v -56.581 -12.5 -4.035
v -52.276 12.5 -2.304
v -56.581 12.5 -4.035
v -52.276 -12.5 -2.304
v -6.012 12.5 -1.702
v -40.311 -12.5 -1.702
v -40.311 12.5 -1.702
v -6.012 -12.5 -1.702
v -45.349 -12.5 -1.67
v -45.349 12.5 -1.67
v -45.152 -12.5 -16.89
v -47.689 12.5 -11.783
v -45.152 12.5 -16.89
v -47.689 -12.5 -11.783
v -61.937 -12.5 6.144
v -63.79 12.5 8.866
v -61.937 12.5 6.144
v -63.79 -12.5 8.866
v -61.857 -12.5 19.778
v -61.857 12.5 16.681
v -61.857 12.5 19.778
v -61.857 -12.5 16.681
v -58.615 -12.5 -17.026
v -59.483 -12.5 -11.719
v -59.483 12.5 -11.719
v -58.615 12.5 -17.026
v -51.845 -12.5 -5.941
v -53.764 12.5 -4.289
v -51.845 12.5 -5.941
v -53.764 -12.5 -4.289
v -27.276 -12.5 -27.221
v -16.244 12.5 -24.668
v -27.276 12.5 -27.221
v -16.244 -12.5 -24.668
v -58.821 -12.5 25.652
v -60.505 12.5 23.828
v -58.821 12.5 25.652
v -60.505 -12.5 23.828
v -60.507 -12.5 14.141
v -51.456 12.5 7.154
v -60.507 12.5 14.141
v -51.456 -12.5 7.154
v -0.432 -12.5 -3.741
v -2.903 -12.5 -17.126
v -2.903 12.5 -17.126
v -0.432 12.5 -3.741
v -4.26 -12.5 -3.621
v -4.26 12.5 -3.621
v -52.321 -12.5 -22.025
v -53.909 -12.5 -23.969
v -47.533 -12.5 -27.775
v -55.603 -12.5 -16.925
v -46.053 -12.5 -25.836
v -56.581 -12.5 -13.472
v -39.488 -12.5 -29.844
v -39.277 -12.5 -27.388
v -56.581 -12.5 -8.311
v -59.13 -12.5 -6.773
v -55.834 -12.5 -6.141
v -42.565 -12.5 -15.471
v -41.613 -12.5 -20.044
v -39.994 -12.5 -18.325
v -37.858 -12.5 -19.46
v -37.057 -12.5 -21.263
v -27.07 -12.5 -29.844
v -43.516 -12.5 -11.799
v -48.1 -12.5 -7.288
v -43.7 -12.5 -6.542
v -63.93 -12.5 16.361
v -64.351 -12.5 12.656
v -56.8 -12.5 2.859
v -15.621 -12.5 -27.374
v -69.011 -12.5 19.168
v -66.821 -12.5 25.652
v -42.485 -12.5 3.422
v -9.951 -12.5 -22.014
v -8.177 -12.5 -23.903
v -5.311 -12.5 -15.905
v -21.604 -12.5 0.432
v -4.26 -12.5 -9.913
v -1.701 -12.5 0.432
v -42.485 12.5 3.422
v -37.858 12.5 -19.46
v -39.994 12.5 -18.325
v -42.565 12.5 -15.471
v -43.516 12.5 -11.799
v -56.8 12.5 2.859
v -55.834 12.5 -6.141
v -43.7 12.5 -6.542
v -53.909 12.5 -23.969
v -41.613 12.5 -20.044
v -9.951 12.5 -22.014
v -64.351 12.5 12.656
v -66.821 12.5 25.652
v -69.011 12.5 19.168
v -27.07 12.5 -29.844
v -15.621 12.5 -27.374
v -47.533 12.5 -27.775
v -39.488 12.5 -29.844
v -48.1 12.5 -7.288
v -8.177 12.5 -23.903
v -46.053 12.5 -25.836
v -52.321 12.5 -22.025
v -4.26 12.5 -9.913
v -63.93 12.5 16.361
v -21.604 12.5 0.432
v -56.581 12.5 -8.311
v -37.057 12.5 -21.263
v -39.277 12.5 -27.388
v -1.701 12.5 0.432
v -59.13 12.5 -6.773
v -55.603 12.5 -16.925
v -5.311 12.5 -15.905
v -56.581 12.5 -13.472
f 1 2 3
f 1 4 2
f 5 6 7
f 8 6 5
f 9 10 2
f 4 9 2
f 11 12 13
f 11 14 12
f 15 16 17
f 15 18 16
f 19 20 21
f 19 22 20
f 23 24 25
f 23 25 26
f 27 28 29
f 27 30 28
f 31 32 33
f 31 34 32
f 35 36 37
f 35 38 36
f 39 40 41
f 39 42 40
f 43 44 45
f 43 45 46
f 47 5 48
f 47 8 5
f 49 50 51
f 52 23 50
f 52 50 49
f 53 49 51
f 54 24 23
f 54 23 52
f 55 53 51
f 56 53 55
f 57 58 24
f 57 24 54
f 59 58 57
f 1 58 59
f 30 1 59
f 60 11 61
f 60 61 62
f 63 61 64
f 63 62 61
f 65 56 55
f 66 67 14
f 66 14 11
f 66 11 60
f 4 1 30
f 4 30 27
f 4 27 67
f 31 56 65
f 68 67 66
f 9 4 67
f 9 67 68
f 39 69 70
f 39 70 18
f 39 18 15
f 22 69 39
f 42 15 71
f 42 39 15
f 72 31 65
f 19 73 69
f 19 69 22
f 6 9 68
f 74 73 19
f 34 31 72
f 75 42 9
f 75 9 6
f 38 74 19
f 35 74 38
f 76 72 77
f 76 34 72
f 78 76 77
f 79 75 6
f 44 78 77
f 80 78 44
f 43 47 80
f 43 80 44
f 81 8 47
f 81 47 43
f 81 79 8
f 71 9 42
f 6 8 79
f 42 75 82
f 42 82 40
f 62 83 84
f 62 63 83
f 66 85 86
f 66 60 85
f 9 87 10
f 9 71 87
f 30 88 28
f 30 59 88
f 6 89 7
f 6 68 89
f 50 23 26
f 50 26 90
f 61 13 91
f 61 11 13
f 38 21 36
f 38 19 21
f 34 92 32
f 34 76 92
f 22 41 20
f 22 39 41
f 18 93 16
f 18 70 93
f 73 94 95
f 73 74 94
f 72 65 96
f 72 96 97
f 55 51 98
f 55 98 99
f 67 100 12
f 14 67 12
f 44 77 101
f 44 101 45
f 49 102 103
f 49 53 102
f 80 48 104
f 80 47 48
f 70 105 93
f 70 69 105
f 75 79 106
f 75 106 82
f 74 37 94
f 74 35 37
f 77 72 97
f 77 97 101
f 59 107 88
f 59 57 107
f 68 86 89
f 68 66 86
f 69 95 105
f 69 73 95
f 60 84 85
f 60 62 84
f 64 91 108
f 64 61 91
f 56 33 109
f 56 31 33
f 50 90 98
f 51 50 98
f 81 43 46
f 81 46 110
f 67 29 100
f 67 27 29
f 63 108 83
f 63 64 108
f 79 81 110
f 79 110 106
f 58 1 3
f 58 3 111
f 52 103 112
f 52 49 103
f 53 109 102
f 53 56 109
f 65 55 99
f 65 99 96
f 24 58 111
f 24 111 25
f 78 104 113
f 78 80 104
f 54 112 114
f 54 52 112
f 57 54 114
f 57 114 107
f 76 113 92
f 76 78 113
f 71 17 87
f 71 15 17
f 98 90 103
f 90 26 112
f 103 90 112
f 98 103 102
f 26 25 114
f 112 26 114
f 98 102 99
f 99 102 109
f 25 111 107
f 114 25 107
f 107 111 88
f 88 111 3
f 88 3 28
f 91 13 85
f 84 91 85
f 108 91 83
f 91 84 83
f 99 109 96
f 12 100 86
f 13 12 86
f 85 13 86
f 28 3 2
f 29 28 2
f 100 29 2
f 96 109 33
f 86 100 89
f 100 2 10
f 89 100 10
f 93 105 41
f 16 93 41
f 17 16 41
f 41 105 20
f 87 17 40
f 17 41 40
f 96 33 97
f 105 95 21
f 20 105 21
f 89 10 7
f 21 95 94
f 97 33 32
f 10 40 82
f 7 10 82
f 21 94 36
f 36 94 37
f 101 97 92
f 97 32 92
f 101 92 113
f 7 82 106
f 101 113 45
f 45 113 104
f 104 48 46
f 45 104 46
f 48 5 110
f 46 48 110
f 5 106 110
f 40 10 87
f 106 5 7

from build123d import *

# Parameters (mm, degrees)
F1_DEPTH = 12.5


with BuildPart() as f1:
    # F0 (on Front) → F1 (new body, symmetric)
    with BuildSketch(Plane.XZ):
        Polygon((-52.275904, -2.303776), (-56.58076, -4.034938), (-59.129985, -6.772994), (-59.483321, -11.718572), (-58.615414, -17.026151), (-53.908695, -23.969399), (-47.532922, -27.774831), (-39.488101, -29.844454), (-27.070367, -29.844454), (-15.620685, -27.374261), (-8.176722, -23.902636), (-2.902524, -17.126292), (-0.43233, -3.740512), (-1.700808, 0.432113), (-21.604338, 0.432113), (-42.484921, 3.422433), (-51.456425, 7.153944), (-60.507324, 14.140602), (-61.857025, 16.681206), (-61.857025, 19.777565), (-60.505413, 23.82762), (-58.821212, 25.652167), (-66.821156, 25.652167), (-69.010613, 19.168006), (-63.929948, 16.36101), (-64.350999, 12.655774), (-63.789598, 8.86633), (-61.936983, 6.143543), (-56.800178, 2.859358), (-45.349349, -1.669537), align=None)
        Polygon((-56.58076, -13.471695), (-56.58076, -8.311095), (-55.833608, -6.141283), (-53.763984, -4.288638), (-51.844578, -5.940998), (-48.100221, -7.287823), (-47.688644, -11.782673), (-45.15169, -16.889966), (-41.613301, -20.044469), (-37.056797, -21.262877), (-37.857941, -19.460302), (-39.994321, -18.325348), (-42.56466, -15.471273), (-43.516018, -11.799362), (-43.699614, -6.541855), (-40.31144, -1.70161), (-6.012463, -1.70161), (-4.259961, -3.621017), (-4.259961, -9.913336), (-5.311462, -15.905227), (-9.951422, -22.013951), (-16.243739, -24.667738), (-27.276158, -27.221385), (-39.276629, -27.388292), (-46.052973, -25.836074), (-52.32143, -22.025112), (-55.603315, -16.925327), align=None, mode=Mode.SUBTRACT)
    extrude(amount=F1_DEPTH, both=True)


solid = f1.part
